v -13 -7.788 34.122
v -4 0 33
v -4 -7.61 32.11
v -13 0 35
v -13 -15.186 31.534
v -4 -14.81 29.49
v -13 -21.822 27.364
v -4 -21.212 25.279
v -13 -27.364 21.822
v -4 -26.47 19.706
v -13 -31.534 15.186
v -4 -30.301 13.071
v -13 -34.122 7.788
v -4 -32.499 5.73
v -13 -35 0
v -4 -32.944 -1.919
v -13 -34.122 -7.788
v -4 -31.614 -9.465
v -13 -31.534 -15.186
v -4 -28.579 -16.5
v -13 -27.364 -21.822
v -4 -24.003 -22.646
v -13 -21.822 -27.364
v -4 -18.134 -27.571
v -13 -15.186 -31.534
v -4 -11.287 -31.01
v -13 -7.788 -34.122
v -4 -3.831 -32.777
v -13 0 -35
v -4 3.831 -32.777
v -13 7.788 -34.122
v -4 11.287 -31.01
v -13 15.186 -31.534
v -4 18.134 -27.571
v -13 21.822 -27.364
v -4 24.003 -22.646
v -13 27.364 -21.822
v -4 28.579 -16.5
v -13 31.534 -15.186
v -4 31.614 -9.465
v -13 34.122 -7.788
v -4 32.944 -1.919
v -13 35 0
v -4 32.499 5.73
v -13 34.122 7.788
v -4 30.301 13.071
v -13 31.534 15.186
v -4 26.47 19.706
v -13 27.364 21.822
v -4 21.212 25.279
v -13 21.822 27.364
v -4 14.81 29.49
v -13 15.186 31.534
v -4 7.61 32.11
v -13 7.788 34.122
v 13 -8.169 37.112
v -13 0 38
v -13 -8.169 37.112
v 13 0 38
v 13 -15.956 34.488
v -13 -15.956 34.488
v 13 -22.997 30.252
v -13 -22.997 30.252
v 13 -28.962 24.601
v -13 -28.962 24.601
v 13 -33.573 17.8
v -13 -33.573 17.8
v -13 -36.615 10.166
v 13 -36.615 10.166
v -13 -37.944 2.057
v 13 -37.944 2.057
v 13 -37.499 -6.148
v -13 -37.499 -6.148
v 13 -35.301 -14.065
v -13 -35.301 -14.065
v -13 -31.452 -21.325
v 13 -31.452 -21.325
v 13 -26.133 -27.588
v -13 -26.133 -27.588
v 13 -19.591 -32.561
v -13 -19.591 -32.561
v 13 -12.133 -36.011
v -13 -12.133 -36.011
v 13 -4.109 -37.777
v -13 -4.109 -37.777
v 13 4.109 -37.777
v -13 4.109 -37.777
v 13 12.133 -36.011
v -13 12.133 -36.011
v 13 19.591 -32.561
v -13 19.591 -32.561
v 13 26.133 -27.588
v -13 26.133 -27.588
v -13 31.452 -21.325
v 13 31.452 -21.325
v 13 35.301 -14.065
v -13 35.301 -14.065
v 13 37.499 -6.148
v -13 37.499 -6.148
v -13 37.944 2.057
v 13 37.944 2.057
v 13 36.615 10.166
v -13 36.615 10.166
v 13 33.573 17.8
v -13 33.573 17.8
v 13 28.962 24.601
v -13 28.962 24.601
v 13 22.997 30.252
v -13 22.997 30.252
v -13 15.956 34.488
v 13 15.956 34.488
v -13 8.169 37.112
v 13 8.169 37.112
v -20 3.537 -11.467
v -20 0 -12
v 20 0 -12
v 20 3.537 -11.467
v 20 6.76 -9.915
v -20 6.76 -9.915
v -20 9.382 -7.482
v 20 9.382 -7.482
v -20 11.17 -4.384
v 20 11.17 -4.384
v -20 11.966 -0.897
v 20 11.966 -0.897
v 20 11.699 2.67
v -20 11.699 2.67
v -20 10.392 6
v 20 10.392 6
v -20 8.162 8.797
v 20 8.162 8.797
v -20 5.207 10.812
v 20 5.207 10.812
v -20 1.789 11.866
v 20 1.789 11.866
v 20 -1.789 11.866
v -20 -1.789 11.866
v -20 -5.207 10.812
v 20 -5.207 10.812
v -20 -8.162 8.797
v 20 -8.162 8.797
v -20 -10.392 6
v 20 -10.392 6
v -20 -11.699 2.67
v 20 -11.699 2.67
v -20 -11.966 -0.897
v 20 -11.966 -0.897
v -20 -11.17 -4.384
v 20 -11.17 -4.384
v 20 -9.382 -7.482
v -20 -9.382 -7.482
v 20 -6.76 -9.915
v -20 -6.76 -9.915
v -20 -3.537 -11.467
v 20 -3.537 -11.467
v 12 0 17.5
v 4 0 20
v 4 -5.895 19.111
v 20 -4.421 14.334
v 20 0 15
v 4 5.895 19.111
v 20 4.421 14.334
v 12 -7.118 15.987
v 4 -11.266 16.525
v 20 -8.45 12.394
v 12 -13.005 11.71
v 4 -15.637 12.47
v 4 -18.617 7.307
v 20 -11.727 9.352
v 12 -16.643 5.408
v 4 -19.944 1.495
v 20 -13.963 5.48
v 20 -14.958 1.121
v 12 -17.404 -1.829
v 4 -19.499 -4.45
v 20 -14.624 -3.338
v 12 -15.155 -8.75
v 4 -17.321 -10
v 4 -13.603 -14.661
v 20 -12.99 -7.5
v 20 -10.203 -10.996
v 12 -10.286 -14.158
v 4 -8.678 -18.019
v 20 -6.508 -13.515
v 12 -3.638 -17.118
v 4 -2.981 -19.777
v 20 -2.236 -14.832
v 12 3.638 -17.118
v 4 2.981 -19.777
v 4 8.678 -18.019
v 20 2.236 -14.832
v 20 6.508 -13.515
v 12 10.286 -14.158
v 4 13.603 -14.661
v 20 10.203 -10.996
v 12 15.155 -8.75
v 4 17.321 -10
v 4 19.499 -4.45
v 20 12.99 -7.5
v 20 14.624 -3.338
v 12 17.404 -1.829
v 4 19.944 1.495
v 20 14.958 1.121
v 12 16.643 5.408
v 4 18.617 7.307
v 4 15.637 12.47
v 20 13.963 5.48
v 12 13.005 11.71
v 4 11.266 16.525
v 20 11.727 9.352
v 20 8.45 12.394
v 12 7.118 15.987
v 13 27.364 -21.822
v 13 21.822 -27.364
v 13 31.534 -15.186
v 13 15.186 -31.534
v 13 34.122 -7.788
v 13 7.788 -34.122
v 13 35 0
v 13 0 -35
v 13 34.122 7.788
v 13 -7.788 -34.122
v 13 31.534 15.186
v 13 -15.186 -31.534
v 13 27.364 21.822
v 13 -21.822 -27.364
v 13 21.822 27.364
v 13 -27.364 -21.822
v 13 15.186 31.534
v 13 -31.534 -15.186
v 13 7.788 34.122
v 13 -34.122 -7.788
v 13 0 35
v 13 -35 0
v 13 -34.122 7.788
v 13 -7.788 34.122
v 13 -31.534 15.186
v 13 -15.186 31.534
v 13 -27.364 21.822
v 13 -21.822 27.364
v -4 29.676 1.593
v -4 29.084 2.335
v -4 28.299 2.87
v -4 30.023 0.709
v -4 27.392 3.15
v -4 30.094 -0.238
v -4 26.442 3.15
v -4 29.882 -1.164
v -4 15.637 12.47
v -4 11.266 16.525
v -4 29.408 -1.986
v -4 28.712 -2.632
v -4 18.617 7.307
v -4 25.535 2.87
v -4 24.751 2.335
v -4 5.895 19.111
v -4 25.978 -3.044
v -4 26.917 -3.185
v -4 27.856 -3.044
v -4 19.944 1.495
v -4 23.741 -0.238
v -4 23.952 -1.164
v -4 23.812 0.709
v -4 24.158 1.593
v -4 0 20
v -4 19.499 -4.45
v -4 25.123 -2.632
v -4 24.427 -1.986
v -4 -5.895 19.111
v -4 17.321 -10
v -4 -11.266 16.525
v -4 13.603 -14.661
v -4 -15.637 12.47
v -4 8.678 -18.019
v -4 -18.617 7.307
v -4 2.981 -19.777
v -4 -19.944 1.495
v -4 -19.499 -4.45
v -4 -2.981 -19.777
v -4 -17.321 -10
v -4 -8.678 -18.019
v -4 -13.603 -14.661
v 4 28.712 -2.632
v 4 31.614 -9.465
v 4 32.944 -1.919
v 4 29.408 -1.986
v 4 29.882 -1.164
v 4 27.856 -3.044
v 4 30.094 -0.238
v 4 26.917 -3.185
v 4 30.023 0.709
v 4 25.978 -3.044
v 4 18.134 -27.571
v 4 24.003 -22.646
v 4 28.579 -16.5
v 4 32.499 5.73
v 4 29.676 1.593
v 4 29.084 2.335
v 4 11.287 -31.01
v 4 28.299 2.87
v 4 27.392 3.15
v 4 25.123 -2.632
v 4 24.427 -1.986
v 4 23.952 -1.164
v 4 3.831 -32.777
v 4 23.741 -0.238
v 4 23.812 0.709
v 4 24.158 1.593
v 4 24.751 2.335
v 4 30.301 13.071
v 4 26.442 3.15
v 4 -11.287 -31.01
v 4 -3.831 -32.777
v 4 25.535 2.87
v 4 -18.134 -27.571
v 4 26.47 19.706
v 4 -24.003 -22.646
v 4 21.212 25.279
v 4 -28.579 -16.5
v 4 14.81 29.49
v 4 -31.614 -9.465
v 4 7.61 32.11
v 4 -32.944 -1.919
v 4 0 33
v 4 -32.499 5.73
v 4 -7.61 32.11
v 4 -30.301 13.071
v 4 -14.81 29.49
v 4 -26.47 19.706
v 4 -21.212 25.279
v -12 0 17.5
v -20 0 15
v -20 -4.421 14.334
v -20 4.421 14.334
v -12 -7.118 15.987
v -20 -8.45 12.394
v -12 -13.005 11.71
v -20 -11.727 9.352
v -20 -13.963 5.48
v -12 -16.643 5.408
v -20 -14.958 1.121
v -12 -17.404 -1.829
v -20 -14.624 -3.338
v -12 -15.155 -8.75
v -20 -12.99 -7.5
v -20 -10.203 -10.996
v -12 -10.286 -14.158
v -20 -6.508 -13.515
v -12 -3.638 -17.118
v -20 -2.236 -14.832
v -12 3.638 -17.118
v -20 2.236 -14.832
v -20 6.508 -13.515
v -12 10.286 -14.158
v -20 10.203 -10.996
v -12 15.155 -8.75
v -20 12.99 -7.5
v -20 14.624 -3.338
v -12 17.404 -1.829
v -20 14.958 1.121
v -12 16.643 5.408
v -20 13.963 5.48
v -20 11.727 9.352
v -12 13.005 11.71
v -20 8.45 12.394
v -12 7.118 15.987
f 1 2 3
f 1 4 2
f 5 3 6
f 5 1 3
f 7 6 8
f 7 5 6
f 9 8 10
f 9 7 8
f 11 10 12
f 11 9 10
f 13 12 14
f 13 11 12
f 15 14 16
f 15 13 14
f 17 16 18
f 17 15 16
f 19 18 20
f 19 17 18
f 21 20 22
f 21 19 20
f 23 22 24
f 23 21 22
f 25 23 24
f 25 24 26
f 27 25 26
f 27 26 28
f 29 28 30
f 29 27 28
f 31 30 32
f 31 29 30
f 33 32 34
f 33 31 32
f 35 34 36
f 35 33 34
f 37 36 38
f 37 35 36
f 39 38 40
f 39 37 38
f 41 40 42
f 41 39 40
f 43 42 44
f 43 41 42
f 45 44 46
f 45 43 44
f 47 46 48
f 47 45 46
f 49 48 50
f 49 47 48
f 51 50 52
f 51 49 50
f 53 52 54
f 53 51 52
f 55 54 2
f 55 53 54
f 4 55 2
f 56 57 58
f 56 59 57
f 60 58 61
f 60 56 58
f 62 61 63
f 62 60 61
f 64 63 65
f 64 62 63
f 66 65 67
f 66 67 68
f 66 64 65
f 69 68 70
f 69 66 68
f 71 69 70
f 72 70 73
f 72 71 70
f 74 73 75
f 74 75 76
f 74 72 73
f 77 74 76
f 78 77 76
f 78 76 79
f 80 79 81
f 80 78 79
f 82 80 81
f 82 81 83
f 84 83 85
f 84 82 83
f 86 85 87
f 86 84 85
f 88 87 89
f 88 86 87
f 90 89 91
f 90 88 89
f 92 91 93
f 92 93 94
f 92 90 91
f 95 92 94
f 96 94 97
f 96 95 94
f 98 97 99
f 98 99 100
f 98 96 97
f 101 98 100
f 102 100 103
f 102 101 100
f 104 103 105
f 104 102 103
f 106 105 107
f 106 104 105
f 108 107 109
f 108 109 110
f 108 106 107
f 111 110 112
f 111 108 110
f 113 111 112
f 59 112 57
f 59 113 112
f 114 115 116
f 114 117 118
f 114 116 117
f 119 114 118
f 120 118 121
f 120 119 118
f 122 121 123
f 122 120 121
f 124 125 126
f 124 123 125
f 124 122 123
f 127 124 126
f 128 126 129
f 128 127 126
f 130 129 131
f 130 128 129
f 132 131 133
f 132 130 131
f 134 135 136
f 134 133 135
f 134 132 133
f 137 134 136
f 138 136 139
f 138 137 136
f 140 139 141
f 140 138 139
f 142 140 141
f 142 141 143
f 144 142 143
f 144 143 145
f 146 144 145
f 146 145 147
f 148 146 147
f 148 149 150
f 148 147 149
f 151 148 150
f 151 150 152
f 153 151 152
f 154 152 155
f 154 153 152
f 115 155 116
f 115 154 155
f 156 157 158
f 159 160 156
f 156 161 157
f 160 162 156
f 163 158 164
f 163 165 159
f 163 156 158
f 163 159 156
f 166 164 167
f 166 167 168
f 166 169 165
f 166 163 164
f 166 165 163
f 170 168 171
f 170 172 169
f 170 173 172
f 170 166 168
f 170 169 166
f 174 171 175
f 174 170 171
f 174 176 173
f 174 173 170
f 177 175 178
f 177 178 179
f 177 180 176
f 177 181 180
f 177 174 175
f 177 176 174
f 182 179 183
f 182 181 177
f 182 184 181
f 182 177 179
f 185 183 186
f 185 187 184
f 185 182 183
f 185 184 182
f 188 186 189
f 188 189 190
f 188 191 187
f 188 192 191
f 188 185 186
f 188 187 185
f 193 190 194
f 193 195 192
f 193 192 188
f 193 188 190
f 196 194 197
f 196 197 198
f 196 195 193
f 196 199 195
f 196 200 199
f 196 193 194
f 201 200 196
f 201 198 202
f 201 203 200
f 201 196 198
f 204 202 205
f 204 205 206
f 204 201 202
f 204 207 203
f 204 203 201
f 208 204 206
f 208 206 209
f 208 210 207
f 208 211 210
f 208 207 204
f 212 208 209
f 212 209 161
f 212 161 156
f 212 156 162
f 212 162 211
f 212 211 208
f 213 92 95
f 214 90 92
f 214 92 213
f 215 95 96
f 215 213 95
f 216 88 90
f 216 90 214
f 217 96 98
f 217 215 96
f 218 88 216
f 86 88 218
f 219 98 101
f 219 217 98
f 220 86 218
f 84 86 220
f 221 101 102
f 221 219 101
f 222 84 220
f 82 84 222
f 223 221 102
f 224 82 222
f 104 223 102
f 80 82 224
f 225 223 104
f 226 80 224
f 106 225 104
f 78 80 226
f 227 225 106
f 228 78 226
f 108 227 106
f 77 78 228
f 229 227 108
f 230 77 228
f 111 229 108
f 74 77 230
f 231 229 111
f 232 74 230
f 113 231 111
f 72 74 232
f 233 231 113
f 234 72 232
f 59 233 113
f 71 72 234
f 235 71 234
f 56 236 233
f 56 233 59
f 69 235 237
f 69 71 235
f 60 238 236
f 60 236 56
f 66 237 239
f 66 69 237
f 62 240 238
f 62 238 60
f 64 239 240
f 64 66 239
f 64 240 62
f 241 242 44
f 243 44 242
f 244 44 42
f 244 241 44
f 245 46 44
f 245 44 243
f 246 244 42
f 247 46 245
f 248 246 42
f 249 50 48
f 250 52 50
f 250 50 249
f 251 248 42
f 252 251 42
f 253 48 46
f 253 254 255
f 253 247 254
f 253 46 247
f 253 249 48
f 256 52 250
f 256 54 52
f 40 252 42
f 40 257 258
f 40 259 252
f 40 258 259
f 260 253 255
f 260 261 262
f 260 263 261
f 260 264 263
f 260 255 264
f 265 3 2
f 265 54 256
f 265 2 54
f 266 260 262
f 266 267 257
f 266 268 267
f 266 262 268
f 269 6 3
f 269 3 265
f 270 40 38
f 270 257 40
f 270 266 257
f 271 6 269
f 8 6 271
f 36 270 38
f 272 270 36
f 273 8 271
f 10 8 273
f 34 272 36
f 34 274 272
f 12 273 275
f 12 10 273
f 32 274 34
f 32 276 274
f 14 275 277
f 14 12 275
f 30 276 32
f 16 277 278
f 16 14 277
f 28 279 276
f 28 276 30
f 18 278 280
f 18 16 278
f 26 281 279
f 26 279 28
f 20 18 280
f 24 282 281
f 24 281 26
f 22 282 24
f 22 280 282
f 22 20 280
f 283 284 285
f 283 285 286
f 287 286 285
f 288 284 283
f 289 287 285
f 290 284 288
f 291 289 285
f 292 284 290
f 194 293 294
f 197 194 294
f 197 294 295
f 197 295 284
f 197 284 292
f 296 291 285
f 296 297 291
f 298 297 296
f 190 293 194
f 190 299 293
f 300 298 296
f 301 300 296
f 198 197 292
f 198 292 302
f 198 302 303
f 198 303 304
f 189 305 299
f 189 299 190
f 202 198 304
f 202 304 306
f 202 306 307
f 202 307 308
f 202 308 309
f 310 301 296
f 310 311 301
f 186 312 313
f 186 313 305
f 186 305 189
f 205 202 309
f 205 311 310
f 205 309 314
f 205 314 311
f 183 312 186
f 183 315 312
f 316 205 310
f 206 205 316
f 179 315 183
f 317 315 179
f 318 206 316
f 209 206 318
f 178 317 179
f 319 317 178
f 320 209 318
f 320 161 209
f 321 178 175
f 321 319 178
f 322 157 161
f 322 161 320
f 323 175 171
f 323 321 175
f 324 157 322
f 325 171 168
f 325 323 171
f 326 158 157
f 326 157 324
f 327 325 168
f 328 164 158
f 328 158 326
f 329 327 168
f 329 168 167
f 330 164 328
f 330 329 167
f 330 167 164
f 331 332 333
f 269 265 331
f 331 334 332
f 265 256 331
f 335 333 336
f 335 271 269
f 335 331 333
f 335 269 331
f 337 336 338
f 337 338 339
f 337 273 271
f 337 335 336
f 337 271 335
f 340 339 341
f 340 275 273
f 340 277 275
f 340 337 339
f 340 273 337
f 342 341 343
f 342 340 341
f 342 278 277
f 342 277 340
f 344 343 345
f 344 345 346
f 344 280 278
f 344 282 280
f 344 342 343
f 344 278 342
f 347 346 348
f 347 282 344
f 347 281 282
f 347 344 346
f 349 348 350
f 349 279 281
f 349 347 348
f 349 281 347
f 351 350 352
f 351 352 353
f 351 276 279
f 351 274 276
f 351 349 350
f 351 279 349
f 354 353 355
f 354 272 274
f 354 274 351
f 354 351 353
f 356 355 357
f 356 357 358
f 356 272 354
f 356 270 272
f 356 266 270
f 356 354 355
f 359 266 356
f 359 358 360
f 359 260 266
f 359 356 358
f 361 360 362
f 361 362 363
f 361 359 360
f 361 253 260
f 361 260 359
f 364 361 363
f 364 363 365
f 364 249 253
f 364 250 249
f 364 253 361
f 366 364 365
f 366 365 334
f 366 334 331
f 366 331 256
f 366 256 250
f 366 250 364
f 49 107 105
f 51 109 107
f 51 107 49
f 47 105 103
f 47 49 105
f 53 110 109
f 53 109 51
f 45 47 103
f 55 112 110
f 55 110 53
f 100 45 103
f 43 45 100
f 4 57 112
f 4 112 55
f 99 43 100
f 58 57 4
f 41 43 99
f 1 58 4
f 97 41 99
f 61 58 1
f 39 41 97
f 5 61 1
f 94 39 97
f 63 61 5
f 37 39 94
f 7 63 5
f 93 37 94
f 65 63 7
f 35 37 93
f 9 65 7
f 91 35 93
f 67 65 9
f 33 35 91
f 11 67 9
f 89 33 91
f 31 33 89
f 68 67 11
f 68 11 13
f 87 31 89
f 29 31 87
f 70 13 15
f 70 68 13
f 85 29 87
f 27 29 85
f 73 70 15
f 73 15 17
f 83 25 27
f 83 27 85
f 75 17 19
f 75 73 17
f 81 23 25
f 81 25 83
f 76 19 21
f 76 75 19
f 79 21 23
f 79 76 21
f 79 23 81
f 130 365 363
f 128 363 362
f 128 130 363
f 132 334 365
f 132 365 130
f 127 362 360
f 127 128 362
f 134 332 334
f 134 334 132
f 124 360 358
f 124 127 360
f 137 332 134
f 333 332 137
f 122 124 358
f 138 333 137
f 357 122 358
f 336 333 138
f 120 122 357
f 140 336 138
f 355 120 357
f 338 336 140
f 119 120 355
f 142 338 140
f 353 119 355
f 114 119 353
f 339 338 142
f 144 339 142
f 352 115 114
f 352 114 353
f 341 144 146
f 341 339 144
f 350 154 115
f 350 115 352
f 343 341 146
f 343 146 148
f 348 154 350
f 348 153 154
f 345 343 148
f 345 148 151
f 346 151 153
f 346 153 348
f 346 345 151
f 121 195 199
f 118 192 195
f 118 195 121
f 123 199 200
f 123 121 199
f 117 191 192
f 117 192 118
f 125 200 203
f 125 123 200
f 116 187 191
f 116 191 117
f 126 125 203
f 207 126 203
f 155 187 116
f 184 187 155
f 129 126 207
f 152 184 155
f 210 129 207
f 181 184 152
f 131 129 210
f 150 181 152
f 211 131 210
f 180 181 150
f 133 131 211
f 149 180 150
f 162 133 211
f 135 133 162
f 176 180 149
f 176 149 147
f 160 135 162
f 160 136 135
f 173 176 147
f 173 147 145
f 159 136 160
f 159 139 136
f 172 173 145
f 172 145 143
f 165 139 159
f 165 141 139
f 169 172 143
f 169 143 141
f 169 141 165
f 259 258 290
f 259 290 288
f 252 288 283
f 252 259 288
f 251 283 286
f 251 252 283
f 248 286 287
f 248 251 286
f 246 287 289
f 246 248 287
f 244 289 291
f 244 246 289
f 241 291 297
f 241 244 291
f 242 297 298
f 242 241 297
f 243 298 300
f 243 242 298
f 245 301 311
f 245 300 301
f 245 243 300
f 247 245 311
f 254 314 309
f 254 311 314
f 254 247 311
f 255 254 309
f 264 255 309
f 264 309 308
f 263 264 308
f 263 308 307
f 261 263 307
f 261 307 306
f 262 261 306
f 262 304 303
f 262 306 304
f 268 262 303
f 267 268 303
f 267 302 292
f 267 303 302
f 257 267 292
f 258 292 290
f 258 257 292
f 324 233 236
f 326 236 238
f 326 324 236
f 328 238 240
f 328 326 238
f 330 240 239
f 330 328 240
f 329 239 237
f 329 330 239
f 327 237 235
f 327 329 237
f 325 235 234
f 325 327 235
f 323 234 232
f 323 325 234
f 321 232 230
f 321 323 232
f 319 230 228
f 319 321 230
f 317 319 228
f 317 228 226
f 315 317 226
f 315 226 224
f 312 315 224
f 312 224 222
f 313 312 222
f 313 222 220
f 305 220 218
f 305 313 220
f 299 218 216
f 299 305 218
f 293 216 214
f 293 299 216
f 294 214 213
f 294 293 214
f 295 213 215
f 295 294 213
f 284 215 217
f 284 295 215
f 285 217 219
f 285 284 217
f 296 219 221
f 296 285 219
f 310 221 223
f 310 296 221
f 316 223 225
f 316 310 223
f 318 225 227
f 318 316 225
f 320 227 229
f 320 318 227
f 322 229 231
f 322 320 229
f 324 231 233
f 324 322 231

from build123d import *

# Parameters (mm, degrees)
CUT_EXTRUDE1_DEPTH      = 67.992536898
CUT_EXTRUDE1_DEPTH_BACK = 67.992536898
SKETCH2_R               = 12
CUT_EXTRUDE2_DEPTH      = 59.855755878
CUT_EXTRUDE2_DEPTH_BACK = 59.855755878
SKETCH3_R               = 3.185465226


with BuildPart() as part:
    # Sketch1 → Revolve1 (revolve)
    with BuildSketch(Plane.XY, mode=Mode.PRIVATE) as revolve1_sk:
        Polygon((-13, 38), (13, 38), (13, 35), (4, 33), (4, 20), (20, 15), (20, 0), (-20, 0), (-20, 15), (-4, 20), (-4, 33), (-13, 35), align=None)
    revolve(revolve1_sk.sketch.rotate(Axis((-115.826136374, 0, 0), (1, 0, 0)), 90), axis=Axis((-115.826136374, 0, 0), (1, 0, 0)))

    # Sketch2 → Cut-Extrude1 (cut, two sides: drawn at the far end of the back side and taken through both)
    with BuildSketch(Plane(origin=(20, 0, 0), x_dir=(0, 0, -1), z_dir=(1, 0, 0)).offset(-CUT_EXTRUDE1_DEPTH_BACK)):
        Circle(SKETCH2_R)
    extrude(amount=CUT_EXTRUDE1_DEPTH + CUT_EXTRUDE1_DEPTH_BACK, mode=Mode.SUBTRACT)

    # Sketch3 → Cut-Extrude2 (cut, two sides: drawn at the far end of the back side and taken through both)
    with BuildSketch(Plane(origin=(4, 0, 0), x_dir=(0, 0, -1), z_dir=(1, 0, 0)).offset(-CUT_EXTRUDE2_DEPTH_BACK)):
        with Locations((0, 26.917181157)):
            Circle(SKETCH3_R)
    extrude(amount=CUT_EXTRUDE2_DEPTH + CUT_EXTRUDE2_DEPTH_BACK, mode=Mode.SUBTRACT)


solid = part.part
